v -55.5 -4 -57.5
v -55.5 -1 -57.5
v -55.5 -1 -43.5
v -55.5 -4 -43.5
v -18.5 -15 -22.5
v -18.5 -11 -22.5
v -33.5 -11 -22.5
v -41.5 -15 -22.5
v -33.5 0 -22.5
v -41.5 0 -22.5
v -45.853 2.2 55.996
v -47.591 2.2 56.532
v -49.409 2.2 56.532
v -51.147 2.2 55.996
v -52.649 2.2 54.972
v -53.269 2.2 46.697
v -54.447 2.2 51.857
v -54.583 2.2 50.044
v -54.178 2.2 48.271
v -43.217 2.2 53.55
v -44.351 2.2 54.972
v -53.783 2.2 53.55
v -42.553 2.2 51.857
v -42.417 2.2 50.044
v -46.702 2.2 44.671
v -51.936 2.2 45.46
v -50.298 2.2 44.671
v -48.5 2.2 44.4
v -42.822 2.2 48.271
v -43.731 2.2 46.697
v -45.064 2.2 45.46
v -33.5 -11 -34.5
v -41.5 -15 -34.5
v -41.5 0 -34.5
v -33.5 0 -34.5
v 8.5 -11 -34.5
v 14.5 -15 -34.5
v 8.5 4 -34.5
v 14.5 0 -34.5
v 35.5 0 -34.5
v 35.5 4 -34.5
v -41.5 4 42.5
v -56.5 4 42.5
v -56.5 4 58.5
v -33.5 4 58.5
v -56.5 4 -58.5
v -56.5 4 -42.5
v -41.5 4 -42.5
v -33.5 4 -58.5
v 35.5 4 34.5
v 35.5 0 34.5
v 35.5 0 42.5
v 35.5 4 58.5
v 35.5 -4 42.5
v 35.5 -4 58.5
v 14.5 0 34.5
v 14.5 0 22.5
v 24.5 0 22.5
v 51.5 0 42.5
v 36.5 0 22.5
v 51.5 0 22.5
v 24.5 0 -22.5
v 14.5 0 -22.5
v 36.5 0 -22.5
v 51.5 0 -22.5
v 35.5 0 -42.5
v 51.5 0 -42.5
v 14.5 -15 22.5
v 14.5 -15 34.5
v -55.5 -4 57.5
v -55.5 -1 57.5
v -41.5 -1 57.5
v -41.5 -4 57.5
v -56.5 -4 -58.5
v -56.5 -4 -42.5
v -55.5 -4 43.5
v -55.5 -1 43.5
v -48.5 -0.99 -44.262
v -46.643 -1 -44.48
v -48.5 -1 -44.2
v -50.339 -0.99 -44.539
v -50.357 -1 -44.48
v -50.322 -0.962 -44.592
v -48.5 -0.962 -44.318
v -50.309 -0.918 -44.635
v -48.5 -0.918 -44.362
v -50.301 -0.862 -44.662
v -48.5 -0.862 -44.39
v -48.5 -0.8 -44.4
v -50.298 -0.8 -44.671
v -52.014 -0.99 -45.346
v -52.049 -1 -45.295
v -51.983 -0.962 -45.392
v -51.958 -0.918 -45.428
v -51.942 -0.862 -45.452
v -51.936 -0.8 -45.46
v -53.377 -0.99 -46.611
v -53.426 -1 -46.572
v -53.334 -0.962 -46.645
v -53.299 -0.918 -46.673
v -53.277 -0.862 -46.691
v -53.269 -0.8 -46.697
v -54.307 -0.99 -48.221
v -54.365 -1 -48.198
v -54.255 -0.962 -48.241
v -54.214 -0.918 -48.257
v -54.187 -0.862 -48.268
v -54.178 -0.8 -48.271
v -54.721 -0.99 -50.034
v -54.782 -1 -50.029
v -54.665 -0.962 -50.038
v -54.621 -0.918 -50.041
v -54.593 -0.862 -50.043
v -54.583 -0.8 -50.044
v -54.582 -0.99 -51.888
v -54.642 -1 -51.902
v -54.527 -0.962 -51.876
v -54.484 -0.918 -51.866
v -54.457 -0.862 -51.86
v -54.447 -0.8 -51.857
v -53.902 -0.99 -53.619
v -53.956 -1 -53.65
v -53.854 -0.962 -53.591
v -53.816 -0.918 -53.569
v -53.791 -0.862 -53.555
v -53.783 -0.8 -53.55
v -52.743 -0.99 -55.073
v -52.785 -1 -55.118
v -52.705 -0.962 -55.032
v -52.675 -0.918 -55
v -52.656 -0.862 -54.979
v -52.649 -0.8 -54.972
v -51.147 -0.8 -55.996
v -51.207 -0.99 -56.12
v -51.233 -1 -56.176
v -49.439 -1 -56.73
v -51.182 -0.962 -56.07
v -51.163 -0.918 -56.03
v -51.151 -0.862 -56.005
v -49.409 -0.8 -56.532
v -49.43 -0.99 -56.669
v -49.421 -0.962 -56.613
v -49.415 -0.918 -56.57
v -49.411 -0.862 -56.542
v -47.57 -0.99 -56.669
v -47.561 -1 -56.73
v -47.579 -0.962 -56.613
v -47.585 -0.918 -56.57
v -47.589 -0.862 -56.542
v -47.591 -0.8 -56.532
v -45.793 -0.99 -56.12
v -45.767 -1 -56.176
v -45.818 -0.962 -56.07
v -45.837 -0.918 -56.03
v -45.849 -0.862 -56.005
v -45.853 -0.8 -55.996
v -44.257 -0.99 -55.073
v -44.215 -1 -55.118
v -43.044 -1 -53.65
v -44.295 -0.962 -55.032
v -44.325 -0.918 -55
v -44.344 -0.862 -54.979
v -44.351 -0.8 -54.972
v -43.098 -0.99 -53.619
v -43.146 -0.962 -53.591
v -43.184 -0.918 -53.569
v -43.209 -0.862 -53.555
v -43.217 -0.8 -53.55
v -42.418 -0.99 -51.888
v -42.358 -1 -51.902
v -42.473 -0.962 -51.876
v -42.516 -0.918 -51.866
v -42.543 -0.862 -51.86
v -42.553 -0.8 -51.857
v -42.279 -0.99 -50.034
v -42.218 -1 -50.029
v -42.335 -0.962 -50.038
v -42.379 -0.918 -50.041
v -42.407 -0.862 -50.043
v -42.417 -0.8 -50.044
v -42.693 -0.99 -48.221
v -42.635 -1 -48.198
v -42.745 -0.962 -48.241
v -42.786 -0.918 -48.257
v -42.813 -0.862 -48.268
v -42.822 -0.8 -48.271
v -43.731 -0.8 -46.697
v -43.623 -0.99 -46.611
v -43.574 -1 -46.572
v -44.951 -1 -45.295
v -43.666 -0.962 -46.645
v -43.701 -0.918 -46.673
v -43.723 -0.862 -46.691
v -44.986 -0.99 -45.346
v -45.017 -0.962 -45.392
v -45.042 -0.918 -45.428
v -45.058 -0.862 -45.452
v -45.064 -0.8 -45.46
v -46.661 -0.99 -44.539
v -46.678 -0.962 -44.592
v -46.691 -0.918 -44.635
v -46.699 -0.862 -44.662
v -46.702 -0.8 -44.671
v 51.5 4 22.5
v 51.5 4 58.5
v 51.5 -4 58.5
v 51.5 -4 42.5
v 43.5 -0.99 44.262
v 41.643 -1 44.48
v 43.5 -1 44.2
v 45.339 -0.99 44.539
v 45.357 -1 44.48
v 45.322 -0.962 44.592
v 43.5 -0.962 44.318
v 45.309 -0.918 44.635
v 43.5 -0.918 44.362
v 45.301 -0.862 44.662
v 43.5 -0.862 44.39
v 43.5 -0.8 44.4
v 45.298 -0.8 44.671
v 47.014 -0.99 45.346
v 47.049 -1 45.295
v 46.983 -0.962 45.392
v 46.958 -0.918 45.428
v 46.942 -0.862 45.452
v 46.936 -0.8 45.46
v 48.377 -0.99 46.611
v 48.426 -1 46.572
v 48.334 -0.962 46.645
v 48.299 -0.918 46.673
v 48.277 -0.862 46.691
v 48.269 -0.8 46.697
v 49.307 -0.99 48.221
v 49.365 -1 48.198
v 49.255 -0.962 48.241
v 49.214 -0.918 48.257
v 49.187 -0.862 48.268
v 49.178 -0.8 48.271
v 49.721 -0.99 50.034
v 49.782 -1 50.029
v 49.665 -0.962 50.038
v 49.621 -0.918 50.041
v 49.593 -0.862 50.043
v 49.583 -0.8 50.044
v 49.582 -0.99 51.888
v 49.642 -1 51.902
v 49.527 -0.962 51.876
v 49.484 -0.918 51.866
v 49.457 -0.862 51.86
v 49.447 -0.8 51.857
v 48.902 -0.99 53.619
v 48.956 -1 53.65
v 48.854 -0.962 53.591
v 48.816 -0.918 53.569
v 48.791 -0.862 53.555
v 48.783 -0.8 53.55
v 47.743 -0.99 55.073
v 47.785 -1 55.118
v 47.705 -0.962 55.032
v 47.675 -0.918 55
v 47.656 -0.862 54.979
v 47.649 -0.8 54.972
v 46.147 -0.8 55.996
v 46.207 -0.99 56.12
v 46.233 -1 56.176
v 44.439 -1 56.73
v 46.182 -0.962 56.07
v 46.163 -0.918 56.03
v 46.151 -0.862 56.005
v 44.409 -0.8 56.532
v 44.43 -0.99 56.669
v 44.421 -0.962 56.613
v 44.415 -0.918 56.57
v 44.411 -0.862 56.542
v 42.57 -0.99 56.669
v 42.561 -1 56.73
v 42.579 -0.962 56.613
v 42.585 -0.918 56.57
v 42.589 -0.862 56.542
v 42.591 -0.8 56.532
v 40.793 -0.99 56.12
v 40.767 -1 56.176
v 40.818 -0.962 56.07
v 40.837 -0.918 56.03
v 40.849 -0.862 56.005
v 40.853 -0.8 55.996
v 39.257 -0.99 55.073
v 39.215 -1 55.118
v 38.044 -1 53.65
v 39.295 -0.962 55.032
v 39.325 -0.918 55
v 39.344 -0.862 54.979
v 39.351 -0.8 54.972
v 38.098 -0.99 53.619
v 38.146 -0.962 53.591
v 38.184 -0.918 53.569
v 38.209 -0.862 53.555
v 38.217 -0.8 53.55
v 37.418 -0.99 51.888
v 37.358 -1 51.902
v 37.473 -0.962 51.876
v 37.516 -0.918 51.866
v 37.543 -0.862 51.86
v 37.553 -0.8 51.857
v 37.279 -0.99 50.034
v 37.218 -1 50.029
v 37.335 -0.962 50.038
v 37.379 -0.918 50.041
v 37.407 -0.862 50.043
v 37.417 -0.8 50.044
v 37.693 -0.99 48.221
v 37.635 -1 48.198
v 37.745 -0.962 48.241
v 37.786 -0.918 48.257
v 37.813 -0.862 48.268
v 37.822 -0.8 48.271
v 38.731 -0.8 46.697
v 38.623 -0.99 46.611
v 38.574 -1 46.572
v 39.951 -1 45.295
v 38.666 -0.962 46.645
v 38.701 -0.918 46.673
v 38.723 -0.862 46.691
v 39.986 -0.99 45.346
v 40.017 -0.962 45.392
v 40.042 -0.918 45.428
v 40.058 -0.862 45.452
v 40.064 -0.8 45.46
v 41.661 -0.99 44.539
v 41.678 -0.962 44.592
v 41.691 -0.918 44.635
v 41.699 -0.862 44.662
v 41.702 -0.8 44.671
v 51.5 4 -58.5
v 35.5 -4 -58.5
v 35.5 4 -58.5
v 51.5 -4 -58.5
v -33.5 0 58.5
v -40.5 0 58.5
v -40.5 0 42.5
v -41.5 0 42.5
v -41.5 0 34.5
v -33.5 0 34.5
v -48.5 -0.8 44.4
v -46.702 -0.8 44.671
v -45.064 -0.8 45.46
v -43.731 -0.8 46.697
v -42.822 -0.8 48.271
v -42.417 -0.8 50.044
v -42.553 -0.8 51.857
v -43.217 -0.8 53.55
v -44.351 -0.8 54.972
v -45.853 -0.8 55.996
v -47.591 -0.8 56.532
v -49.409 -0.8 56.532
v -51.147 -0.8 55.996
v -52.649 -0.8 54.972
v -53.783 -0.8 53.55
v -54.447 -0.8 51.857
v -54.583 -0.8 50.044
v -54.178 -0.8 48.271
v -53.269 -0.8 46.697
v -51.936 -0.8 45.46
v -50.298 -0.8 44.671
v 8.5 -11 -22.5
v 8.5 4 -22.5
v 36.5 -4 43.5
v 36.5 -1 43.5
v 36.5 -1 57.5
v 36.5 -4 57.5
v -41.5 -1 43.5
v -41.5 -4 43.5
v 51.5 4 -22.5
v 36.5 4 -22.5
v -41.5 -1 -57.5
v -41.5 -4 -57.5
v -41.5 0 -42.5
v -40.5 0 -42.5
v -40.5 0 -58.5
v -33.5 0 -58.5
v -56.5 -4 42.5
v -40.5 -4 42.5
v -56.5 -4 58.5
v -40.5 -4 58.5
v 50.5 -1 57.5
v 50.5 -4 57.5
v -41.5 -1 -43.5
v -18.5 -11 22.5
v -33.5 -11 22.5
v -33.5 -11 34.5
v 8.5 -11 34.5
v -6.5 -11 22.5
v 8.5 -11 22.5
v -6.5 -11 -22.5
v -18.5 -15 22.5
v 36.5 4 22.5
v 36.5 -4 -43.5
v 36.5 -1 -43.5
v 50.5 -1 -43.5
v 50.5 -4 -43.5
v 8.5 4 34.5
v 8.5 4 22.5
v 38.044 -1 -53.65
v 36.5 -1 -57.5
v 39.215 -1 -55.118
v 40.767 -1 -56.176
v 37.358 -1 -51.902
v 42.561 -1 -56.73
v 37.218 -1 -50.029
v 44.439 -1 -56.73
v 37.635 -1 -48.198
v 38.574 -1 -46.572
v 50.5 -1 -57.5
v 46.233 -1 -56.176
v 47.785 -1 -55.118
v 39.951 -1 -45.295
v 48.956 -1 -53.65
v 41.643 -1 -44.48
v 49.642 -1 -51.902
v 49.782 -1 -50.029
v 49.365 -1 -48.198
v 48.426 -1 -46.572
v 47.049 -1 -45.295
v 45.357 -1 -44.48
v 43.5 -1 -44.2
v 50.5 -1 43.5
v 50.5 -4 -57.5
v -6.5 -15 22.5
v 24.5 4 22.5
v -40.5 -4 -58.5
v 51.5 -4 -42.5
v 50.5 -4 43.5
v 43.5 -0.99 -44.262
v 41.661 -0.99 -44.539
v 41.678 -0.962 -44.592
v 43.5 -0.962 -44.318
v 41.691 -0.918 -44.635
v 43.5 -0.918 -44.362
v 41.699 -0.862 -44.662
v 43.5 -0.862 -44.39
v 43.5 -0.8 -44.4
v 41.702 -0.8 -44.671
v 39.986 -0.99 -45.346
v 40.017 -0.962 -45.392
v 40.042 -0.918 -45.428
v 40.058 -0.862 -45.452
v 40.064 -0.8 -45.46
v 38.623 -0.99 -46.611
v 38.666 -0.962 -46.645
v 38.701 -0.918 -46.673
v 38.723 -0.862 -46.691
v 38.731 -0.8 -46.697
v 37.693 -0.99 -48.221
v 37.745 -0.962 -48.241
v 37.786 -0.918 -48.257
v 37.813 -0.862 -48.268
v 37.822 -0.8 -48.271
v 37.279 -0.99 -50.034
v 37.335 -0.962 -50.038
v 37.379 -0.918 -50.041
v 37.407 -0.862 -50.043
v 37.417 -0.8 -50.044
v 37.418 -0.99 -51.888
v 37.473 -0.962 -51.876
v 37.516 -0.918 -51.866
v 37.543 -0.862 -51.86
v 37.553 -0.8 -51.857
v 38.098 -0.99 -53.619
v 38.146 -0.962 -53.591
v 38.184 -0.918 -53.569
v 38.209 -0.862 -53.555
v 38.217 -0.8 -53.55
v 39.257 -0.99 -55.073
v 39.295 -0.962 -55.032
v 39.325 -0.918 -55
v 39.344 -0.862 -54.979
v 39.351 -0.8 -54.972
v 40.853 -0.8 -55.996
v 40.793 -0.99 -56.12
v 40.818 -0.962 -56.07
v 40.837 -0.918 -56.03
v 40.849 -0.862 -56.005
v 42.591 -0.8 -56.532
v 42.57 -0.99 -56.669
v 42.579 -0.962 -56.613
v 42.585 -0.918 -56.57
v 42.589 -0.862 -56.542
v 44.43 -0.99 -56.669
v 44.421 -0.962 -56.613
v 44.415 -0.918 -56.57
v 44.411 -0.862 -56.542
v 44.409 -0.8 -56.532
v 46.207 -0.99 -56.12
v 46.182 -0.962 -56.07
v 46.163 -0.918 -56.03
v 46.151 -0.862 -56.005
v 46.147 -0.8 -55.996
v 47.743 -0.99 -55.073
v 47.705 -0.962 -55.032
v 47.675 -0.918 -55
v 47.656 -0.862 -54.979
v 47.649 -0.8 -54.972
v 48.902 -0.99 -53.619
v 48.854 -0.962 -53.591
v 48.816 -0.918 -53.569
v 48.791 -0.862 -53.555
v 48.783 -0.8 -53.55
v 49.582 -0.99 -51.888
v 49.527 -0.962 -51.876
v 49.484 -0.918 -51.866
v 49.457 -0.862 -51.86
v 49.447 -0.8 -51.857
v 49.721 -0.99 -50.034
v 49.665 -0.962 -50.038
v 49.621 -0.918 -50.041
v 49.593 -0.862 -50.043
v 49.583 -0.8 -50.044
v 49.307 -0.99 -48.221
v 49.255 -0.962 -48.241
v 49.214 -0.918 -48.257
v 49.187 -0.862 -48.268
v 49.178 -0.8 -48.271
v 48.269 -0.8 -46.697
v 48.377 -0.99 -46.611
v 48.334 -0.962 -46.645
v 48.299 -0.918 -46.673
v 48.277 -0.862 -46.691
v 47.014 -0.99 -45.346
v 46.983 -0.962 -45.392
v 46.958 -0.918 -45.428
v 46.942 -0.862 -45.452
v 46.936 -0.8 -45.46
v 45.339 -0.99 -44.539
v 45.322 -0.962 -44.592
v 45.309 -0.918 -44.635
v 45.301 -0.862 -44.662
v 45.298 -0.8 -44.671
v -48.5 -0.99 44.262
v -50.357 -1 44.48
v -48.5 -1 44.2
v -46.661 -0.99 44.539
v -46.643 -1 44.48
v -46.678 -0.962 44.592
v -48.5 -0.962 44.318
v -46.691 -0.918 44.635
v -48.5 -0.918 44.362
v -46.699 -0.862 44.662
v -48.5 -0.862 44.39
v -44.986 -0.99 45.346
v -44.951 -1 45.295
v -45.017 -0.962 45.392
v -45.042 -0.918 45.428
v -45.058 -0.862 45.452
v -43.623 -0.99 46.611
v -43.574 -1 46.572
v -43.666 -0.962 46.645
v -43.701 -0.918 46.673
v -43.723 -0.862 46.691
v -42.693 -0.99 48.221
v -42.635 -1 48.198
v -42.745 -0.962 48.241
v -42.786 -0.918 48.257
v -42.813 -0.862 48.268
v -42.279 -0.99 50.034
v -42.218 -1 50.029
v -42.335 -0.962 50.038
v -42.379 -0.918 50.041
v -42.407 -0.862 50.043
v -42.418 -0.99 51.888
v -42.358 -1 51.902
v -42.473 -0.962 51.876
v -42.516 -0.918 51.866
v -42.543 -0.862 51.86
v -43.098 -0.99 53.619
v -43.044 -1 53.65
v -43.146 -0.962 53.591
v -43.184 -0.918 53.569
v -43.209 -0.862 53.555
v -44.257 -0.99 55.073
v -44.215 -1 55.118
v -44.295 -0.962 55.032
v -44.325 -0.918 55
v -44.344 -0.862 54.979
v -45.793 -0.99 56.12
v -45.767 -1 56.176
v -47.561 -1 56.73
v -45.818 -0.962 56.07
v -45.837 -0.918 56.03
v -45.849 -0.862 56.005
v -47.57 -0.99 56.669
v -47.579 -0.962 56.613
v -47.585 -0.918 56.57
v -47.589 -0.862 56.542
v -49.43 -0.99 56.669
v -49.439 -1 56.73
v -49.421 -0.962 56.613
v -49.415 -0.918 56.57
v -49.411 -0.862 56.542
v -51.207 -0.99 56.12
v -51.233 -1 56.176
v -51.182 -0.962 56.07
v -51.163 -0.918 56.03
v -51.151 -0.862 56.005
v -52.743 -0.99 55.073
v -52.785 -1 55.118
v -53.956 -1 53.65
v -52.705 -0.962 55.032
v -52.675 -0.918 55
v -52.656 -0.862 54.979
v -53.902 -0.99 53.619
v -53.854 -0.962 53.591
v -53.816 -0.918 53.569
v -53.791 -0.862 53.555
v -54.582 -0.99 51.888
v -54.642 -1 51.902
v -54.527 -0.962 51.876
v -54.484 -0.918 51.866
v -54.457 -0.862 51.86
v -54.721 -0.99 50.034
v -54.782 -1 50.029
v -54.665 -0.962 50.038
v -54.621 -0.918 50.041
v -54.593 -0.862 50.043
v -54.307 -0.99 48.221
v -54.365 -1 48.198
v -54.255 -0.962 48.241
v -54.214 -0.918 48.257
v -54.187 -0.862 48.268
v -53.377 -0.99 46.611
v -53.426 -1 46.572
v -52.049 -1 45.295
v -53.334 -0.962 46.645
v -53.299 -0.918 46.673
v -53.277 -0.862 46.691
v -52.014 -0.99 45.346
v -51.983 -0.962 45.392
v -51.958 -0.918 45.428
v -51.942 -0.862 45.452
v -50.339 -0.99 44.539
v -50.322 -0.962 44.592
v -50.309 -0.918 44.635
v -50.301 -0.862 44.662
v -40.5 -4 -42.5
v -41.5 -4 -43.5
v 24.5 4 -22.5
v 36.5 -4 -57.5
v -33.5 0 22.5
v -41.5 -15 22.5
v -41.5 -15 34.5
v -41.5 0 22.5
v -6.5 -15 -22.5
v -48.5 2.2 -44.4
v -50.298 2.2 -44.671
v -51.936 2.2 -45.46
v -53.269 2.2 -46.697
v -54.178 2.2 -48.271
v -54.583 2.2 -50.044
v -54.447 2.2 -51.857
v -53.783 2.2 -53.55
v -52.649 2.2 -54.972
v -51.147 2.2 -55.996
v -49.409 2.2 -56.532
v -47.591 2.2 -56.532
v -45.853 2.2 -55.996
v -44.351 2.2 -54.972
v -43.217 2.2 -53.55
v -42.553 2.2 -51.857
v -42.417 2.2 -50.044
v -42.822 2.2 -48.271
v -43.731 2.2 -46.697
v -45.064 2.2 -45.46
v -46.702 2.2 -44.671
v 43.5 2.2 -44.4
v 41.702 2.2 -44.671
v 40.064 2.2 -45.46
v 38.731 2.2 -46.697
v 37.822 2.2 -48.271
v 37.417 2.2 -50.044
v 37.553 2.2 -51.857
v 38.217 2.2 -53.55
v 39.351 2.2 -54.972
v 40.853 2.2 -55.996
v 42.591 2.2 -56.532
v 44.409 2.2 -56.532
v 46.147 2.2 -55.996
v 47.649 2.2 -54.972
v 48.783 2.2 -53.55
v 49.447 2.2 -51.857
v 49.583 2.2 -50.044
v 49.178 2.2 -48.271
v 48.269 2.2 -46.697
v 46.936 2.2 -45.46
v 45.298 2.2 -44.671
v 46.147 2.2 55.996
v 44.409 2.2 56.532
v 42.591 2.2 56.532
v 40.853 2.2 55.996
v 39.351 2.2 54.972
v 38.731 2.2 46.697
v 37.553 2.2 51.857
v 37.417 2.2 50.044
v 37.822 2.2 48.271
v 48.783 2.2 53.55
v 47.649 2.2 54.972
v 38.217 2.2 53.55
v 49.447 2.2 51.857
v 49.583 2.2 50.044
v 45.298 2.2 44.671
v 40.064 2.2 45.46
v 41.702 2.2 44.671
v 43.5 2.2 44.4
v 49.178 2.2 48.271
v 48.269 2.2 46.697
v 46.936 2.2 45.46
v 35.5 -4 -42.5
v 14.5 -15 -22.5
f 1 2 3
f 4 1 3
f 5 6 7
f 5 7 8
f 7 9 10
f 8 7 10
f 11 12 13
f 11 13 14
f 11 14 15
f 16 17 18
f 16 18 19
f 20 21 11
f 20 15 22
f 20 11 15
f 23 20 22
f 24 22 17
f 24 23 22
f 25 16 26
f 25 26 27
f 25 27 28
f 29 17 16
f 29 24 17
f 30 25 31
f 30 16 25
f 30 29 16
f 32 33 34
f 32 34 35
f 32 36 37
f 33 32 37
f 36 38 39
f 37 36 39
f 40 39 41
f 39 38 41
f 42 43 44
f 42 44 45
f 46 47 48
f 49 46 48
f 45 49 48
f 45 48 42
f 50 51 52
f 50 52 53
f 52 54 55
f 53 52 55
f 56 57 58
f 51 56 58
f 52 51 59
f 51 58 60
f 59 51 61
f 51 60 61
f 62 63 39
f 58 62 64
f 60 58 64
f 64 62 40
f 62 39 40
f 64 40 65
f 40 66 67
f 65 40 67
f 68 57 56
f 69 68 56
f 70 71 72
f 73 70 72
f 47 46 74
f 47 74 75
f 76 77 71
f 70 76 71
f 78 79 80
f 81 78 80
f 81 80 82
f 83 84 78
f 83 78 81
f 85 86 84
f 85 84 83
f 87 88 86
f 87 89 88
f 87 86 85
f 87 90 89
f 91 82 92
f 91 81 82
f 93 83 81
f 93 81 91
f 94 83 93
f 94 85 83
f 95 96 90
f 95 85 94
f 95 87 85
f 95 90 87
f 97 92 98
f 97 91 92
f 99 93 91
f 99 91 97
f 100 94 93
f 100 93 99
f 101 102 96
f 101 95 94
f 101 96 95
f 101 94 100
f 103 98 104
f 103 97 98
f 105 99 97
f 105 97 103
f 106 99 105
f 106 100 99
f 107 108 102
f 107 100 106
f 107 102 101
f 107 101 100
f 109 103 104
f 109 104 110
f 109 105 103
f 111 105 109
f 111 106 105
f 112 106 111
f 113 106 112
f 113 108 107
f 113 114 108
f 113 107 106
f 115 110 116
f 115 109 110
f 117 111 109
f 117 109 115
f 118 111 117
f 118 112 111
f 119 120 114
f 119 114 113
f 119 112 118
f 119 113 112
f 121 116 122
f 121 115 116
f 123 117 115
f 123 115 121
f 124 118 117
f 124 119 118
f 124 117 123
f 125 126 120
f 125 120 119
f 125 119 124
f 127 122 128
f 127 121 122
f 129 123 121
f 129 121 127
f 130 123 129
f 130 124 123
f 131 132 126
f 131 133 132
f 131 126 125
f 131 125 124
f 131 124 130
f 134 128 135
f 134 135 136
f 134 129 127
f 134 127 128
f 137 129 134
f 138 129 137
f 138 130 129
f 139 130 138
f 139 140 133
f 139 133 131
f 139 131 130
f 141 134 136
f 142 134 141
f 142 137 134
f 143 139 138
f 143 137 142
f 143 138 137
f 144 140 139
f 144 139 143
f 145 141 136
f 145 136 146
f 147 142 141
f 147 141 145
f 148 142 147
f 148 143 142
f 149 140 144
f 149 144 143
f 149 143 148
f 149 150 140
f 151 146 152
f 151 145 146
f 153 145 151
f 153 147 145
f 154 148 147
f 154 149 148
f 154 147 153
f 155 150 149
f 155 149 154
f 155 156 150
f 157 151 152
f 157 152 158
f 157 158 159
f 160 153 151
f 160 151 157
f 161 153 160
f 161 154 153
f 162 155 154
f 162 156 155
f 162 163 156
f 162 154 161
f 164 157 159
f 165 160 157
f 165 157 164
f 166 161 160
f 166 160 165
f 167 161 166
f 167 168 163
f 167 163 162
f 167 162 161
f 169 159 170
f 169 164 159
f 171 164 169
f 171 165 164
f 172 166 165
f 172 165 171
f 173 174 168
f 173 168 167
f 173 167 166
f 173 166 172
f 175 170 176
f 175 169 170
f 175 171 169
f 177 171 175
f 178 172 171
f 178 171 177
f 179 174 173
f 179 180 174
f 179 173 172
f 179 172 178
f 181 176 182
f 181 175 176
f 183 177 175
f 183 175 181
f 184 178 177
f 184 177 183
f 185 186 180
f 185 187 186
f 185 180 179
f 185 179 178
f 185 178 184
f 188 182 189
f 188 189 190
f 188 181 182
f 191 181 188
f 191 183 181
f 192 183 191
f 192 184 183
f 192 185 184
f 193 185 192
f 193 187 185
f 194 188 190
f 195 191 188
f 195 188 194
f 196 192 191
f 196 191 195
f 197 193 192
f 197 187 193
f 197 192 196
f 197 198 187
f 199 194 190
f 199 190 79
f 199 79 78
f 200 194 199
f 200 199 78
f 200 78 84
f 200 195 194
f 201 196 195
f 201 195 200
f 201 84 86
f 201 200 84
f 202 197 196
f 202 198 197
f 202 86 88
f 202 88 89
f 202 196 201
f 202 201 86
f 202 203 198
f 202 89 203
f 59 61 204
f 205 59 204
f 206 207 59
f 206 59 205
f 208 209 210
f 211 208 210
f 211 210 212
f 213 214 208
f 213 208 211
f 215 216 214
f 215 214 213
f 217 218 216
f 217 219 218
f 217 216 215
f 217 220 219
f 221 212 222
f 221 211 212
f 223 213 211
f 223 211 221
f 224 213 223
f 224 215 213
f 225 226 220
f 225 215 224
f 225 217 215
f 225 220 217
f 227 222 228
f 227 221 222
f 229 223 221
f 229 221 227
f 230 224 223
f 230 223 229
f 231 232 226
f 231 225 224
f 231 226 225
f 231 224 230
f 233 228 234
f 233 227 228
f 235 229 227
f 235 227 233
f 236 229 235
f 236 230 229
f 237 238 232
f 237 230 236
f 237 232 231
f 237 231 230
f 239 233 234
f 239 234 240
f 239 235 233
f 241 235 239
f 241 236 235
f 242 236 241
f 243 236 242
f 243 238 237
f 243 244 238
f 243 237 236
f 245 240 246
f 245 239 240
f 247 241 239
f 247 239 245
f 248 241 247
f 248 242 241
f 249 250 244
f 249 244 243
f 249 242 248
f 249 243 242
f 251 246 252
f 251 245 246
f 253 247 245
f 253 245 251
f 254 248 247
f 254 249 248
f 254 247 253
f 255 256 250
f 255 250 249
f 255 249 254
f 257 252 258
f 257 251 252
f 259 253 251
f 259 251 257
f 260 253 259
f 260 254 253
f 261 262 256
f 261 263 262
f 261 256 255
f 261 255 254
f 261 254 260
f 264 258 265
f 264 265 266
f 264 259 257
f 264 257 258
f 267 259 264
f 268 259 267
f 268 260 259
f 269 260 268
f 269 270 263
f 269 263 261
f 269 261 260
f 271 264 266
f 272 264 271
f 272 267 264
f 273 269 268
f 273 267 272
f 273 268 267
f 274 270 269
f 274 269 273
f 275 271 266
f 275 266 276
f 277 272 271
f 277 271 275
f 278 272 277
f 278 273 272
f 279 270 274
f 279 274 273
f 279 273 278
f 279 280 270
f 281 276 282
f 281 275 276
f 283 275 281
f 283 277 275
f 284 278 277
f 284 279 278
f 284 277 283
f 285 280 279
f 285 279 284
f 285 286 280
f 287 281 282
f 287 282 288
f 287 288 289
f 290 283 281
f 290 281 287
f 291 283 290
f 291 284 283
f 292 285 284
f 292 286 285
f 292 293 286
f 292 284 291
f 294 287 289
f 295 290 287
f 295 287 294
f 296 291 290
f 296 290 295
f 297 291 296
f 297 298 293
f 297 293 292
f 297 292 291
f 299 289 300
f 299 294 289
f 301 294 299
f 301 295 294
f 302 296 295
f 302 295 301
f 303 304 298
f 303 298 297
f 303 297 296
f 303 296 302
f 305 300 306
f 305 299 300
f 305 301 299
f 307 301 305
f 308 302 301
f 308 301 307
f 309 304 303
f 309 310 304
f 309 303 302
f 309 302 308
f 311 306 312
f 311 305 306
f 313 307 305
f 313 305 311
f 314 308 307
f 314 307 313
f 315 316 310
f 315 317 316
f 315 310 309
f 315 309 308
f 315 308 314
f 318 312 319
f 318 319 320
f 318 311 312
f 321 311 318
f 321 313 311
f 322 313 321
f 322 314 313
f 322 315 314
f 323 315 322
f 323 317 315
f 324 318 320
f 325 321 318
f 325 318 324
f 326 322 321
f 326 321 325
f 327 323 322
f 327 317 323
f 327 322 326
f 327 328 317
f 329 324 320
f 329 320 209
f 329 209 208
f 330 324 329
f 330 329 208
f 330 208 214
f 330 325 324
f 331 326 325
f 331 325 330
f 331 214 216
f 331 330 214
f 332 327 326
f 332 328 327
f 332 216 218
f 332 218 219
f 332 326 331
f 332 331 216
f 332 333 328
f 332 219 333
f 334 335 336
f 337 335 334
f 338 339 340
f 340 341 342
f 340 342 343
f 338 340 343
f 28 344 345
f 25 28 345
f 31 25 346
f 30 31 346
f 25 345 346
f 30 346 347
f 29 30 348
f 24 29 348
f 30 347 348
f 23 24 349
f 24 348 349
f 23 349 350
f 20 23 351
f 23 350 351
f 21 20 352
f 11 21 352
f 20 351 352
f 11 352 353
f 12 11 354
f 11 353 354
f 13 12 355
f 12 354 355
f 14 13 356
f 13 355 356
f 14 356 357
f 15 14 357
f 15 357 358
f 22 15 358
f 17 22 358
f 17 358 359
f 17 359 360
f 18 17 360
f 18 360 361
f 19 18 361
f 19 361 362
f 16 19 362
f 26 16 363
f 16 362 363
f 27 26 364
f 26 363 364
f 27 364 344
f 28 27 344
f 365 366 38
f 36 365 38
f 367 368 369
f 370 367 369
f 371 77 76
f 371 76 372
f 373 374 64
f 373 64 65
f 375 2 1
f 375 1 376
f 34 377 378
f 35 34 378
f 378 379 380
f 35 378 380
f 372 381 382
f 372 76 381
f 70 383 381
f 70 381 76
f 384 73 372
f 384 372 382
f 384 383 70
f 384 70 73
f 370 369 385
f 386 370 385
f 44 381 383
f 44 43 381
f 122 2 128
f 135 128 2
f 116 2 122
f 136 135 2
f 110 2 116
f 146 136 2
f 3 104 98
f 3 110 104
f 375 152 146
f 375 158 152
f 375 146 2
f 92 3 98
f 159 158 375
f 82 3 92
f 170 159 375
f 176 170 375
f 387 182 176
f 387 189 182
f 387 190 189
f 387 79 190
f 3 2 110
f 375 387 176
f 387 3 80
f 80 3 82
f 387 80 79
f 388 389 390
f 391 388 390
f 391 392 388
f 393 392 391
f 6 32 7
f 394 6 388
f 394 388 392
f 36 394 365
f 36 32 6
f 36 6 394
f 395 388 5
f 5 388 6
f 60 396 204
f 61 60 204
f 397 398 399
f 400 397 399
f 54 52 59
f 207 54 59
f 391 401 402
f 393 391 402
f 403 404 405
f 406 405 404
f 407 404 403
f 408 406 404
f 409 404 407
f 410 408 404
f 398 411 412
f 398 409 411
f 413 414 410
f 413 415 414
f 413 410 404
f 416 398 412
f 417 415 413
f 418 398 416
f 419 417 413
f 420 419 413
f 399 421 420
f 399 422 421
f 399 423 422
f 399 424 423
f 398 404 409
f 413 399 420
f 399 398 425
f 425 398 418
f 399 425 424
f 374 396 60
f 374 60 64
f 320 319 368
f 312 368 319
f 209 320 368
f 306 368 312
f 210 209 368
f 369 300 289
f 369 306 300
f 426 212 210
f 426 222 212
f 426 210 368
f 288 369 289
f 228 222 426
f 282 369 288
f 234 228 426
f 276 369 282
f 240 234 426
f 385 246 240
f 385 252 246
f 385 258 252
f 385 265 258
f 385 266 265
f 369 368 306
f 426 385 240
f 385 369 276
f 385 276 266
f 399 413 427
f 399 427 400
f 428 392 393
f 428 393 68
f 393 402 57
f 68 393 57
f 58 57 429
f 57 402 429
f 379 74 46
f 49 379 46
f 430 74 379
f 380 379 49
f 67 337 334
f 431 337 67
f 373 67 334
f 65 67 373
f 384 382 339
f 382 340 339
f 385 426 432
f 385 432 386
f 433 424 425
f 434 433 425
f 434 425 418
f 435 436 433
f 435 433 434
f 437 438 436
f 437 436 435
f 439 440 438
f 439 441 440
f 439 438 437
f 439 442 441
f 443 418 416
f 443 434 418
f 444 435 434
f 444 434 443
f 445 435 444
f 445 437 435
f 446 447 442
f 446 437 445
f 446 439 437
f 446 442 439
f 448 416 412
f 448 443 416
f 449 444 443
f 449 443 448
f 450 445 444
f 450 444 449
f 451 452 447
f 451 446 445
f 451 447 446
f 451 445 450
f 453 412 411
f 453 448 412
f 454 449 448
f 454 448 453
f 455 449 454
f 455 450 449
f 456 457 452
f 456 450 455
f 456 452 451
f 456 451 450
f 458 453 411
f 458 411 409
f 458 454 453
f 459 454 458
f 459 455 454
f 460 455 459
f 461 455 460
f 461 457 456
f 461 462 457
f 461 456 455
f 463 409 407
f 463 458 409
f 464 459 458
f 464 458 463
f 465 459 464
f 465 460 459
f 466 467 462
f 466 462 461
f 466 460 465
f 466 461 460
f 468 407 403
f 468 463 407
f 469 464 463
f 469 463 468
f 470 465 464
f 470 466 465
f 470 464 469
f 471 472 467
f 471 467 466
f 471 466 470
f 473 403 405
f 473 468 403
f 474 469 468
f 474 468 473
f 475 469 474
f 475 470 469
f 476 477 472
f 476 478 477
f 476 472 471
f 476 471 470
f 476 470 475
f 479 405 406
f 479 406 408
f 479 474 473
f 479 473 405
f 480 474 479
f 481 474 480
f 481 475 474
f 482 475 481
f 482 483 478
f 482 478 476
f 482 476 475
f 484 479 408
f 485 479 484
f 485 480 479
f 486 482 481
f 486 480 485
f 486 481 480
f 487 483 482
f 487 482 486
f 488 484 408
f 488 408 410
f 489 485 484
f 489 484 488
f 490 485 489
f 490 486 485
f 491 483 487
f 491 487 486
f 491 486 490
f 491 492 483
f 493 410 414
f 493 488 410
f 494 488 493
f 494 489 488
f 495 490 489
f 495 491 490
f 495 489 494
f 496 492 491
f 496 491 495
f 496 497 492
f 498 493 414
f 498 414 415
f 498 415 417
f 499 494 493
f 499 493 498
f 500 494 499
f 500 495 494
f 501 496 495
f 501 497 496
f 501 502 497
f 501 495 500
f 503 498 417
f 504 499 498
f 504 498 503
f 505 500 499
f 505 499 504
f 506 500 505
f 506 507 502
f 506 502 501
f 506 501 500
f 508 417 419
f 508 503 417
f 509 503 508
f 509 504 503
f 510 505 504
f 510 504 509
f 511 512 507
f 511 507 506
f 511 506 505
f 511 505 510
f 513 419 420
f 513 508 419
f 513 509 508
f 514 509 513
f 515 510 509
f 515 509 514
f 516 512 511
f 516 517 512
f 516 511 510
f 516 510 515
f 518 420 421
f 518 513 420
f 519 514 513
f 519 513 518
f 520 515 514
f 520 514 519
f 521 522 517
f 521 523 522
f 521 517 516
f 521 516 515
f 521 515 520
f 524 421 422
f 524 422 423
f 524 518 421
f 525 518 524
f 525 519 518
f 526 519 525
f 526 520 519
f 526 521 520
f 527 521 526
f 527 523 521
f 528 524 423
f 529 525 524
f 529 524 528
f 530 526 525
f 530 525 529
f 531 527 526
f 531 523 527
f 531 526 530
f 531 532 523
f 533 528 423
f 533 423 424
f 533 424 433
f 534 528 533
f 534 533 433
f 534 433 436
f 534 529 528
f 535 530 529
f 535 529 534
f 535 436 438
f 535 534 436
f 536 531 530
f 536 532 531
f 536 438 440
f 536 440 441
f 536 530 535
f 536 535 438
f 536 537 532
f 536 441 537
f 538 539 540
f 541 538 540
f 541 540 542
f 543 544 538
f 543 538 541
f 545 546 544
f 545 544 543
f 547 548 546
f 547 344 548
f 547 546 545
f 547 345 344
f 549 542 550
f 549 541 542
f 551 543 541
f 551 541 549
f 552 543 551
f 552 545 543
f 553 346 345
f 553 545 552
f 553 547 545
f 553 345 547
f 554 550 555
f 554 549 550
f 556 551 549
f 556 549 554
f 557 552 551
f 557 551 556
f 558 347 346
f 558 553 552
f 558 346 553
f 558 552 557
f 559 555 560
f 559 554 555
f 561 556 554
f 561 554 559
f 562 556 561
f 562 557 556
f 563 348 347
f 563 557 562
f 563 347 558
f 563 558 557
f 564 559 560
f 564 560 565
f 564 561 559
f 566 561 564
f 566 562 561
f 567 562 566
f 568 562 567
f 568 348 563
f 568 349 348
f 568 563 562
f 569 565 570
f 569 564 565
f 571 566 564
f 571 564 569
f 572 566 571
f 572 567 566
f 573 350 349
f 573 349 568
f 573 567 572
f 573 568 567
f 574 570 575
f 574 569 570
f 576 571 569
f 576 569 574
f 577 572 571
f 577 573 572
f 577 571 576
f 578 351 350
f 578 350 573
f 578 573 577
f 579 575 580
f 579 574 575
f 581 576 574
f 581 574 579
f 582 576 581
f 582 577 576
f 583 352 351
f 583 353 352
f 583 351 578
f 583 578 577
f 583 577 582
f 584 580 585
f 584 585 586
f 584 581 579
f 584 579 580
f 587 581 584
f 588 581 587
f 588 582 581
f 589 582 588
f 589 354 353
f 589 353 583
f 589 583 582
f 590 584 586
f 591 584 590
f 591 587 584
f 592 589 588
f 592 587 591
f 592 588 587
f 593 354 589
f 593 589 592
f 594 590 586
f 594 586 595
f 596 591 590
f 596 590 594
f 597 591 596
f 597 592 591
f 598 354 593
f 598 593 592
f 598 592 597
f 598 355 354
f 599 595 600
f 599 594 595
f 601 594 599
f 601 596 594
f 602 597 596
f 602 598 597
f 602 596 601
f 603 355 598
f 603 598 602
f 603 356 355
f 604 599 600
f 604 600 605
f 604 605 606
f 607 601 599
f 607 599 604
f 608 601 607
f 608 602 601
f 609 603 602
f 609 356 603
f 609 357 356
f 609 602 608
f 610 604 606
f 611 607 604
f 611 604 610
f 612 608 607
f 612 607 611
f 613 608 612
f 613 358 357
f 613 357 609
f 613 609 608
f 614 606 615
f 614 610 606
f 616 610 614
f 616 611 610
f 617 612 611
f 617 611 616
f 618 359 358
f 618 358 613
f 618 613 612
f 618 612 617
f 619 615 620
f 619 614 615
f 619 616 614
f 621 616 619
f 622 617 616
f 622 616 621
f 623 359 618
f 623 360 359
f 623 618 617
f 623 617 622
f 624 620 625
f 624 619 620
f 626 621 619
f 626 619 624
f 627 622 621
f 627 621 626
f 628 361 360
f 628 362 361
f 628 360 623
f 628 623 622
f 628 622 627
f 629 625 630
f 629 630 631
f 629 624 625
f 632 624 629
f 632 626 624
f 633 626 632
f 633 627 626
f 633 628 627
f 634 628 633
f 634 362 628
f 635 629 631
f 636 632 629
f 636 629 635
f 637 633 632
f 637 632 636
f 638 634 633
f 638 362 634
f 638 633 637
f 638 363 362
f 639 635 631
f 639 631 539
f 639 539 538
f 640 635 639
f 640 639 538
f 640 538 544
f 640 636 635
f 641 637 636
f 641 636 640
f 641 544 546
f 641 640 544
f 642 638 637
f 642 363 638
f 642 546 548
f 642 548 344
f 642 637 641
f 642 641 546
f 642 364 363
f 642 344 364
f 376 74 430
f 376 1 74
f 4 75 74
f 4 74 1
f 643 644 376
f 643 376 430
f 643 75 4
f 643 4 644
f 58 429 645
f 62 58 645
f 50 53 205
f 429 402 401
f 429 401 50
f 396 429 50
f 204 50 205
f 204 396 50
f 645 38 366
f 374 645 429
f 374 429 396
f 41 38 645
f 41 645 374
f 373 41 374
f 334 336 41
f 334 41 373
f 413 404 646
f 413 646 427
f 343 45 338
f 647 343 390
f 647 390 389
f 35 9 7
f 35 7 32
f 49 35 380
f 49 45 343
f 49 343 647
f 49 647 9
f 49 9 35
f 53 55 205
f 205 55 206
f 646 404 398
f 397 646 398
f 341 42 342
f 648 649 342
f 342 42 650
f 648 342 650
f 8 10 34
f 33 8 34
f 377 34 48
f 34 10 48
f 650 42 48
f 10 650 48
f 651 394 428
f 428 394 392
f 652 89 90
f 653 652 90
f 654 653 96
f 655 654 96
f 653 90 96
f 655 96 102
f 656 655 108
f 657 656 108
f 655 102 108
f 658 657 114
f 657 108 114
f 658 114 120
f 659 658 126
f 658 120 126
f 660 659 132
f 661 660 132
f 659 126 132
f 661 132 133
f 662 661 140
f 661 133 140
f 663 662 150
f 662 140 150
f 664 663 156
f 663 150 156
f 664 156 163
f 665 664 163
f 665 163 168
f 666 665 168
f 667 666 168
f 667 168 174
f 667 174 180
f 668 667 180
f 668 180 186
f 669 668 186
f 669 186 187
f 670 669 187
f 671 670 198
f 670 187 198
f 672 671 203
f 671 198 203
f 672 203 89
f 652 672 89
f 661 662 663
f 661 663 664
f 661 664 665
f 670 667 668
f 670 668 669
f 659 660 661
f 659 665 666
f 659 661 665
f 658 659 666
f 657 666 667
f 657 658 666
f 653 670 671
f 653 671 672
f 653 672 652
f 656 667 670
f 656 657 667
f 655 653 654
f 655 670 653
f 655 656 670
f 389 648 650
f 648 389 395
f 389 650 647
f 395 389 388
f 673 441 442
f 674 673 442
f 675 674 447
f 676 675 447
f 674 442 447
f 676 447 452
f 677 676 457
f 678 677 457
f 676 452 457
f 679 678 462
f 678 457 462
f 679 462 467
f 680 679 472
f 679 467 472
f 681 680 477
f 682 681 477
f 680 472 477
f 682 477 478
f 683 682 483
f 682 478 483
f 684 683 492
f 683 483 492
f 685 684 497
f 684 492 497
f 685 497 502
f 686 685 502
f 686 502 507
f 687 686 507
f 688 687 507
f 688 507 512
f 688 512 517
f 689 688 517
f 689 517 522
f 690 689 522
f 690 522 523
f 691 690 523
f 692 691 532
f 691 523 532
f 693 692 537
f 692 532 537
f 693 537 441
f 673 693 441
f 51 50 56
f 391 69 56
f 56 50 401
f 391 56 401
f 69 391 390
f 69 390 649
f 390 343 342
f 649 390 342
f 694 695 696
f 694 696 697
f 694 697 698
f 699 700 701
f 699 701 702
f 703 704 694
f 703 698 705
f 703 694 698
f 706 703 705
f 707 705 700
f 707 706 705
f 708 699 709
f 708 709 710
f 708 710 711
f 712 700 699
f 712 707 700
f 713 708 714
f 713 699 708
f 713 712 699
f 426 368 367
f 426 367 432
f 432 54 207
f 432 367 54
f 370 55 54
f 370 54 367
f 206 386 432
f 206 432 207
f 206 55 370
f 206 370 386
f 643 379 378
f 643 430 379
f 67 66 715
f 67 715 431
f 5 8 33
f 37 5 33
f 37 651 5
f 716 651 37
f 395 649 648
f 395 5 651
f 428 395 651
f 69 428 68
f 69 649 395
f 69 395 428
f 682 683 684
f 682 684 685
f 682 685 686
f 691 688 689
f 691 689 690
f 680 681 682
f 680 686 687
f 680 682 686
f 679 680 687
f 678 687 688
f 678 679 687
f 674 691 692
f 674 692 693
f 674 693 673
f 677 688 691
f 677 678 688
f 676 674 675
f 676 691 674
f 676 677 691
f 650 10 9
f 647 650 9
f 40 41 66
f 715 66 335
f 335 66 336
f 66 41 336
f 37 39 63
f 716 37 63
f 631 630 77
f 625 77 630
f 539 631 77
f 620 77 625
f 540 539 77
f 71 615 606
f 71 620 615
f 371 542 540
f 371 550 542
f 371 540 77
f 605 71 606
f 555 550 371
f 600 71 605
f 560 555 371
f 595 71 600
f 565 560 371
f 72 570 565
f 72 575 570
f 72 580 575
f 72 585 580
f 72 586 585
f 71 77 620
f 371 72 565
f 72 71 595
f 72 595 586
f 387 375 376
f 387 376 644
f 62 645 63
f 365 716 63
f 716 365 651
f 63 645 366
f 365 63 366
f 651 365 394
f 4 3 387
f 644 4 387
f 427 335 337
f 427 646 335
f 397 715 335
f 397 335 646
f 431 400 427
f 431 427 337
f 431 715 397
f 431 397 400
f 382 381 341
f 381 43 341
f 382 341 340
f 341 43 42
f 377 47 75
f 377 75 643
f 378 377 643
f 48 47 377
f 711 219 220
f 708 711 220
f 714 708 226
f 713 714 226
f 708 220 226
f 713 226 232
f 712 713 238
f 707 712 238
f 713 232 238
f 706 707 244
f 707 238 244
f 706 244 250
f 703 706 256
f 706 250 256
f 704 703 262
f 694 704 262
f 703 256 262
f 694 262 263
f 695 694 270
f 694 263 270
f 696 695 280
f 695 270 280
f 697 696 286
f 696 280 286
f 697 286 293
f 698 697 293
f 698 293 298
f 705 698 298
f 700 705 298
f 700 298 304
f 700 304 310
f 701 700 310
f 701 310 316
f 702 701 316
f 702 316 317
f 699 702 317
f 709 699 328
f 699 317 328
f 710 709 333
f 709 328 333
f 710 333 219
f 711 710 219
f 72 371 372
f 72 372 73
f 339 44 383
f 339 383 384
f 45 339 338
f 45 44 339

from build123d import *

# Parameters (mm, degrees)
SKETCH1_W                       = 113
SKETCH1_H                       = 85
BOSS_EXTRUDE1_DEPTH             = 4
BOSS_EXTRUDE3_REACH             = 72.813
SKETCH4_W                       = 16
SKETCH4_H                       = 16
BOSS_EXTRUDE3_DIRECTION_2_DEPTH = 1
SKETCH10_W                      = 10
SKETCH10_H                      = 16
BOSS_EXTRUDE6_DEPTH             = 4
SKETCH6_W                       = 73
SKETCH6_H                       = 45
SKETCH6_W_2                     = 15
SKETCH6_H_2                     = 85
SKETCH6_W_3                     = 66
SKETCH6_H_3                     = 8
CUT_EXTRUDE2_DEPTH              = 82.483127088
SKETCH8_R                       = 6.1
CUT_EXTRUDE3_DEPTH              = 3.2
SKETCH9_W                       = 16
SKETCH9_H                       = 16
SKETCH9_W_2                     = 14
SKETCH9_H_2                     = 14
BOSS_EXTRUDE5_DEPTH             = 3
FILLET1_R                       = 0.2
SKETCH13_W                      = 85
SKETCH13_H                      = 4
CUT_EXTRUDE4_DEPTH              = 5
SKETCH14_W                      = 93
SKETCH14_H                      = 45
CUT_EXTRUDE5_DEPTH              = 82.722090037
SKETCH15_W                      = 12
SKETCH15_H                      = 45
BOSS_EXTRUDE7_DEPTH             = 4
BOSS_EXTRUDE8_DEPTH             = 15
SKETCH17_W                      = 42
SKETCH17_H                      = 117
CUT_EXTRUDE6_DEPTH              = 15
SKETCH18_W                      = 8
SKETCH18_H                      = 45
BOSS_EXTRUDE9_DEPTH             = 4


with BuildPart() as part:
    # Sketch1 → Boss-Extrude1 (new body)
    with BuildSketch(Plane(origin=(0, 0, 0), x_dir=(1, 0, 0), z_dir=(0, 1, 0))):
        Rectangle(SKETCH1_W, SKETCH1_H)
    extrude(amount=BOSS_EXTRUDE1_DEPTH)

    # Boss-Extrude3: up to this face of the body (flat: up to its plane)
    boss_extrude3_end = Plane(part.part.faces().sort_by_distance((0, 4, 0))[0])
    # Sketch4 → Boss-Extrude3 (add, up to the picked face)
    with BuildSketch(Plane.XZ, mode=Mode.PRIVATE) as boss_extrude3_sk1:
        with Locations((-48.5, 50.5)):
            Rectangle(SKETCH4_W, SKETCH4_H)
    boss_extrude3_tool1 = split(extrude(boss_extrude3_sk1.sketch, amount=-BOSS_EXTRUDE3_REACH, mode=Mode.PRIVATE), bisect_by=boss_extrude3_end, keep=Keep.BOTH, mode=Mode.PRIVATE)
    # Sketch4 → Boss-Extrude3 (add, up to the picked face)
    with BuildSketch(Plane.XZ, mode=Mode.PRIVATE) as boss_extrude3_sk2:
        with Locations((43.5, 50.5)):
            Rectangle(SKETCH4_W, SKETCH4_H)
    boss_extrude3_tool2 = split(extrude(boss_extrude3_sk2.sketch, amount=-BOSS_EXTRUDE3_REACH, mode=Mode.PRIVATE), bisect_by=boss_extrude3_end, keep=Keep.BOTH, mode=Mode.PRIVATE)
    # Sketch4 → Boss-Extrude3 (add, up to the picked face)
    with BuildSketch(Plane.XZ, mode=Mode.PRIVATE) as boss_extrude3_sk3:
        with Locations((43.5, -50.5)):
            Rectangle(SKETCH4_W, SKETCH4_H)
    boss_extrude3_tool3 = split(extrude(boss_extrude3_sk3.sketch, amount=-BOSS_EXTRUDE3_REACH, mode=Mode.PRIVATE), bisect_by=boss_extrude3_end, keep=Keep.BOTH, mode=Mode.PRIVATE)
    # Sketch4 → Boss-Extrude3 (add, up to the picked face)
    with BuildSketch(Plane.XZ, mode=Mode.PRIVATE) as boss_extrude3_sk4:
        with Locations((-48.5, -50.5)):
            Rectangle(SKETCH4_W, SKETCH4_H)
    boss_extrude3_tool4 = split(extrude(boss_extrude3_sk4.sketch, amount=-BOSS_EXTRUDE3_REACH, mode=Mode.PRIVATE), bisect_by=boss_extrude3_end, keep=Keep.BOTH, mode=Mode.PRIVATE)
    add(boss_extrude3_tool1.solids().sort_by(Axis((-48.5, 0, 50.5), (0, 1, 0)))[0])
    add(boss_extrude3_tool2.solids().sort_by(Axis((43.5, 0, 50.5), (0, 1, 0)))[0])
    add(boss_extrude3_tool3.solids().sort_by(Axis((43.5, 0, -50.5), (0, 1, 0)))[0])
    add(boss_extrude3_tool4.solids().sort_by(Axis((-48.5, 0, -50.5), (0, 1, 0)))[0])

    # Sketch4 → Boss-Extrude3 direction 2 (add)
    with BuildSketch(Plane.XZ):
        with Locations((-48.5, 50.5)):
            Rectangle(SKETCH4_W, SKETCH4_H)
        with Locations((43.5, 50.5)):
            Rectangle(SKETCH4_W, SKETCH4_H)
        with Locations((43.5, -50.5)):
            Rectangle(SKETCH4_W, SKETCH4_H)
        with Locations((-48.5, -50.5)):
            Rectangle(SKETCH4_W, SKETCH4_H)
    extrude(amount=BOSS_EXTRUDE3_DIRECTION_2_DEPTH)

    # Sketch10 → Boss-Extrude6 (add)
    with BuildSketch(Plane(origin=(0, 4, 0), x_dir=(1, 0, 0), z_dir=(0, 1, 0))):
        with Locations((-35.5, -50.5)):
            Rectangle(SKETCH10_W, SKETCH10_H)
        with Locations((-35.5, 50.5)):
            Rectangle(SKETCH10_W, SKETCH10_H)
    extrude(amount=-BOSS_EXTRUDE6_DEPTH)

    # Sketch6 → Cut-Extrude2 (cut, through all)
    with BuildSketch(Plane(origin=(0, 4, 0), x_dir=(1, 0, 0), z_dir=(0, 1, 0))):
        with Locations((5, 0)):
            Rectangle(SKETCH6_W, SKETCH6_H)
        with Locations((-49, 0)):
            Rectangle(SKETCH6_W_2, SKETCH6_H_2)
        with Locations((2.5, 38.5)):
            Rectangle(SKETCH6_W_3, SKETCH6_H_3)
        with Locations((2.5, -38.5)):
            Rectangle(SKETCH6_W_3, SKETCH6_H_3)
    extrude(amount=-CUT_EXTRUDE2_DEPTH, mode=Mode.SUBTRACT)

    # Sketch8 → Cut-Extrude3 (cut)
    with BuildSketch(Plane.XZ.offset(1)):
        with Locations(Location((-48.5, 50.5, 0), (0, 0, 270))):
            Circle(SKETCH8_R)
        with Locations(Location((43.5, 50.5, 0), (0, 0, 270))):
            Circle(SKETCH8_R)
        with Locations(Location((43.5, -50.5, 0), (0, 0, 90))):
            Circle(SKETCH8_R)
        with Locations(Location((-48.5, -50.5, 0), (0, 0, 90))):
            Circle(SKETCH8_R)
    extrude(amount=-CUT_EXTRUDE3_DEPTH, mode=Mode.SUBTRACT)

    # Sketch9 → Boss-Extrude5 (add)
    # profile 1 of 4: a face of its own
    with BuildSketch(Plane.XZ.offset(1)):
        with Locations((-48.5, 50.5)):
            Rectangle(SKETCH9_W, SKETCH9_H)
        with Locations((-48.5, 50.5)):
            Rectangle(SKETCH9_W_2, SKETCH9_H_2, mode=Mode.SUBTRACT)
    # profile 2 of 4: a face of its own
    with BuildSketch(Plane.XZ.offset(1)):
        with Locations((43.5, 50.5)):
            Rectangle(SKETCH9_W, SKETCH9_H)
        with Locations((43.5, 50.5)):
            Rectangle(SKETCH9_W_2, SKETCH9_H_2, mode=Mode.SUBTRACT)
    # profile 3 of 4: a face of its own
    with BuildSketch(Plane.XZ.offset(1)):
        with Locations((43.5, -50.5)):
            Rectangle(SKETCH9_W, SKETCH9_H)
        with Locations((43.5, -50.5)):
            Rectangle(SKETCH9_W_2, SKETCH9_H_2, mode=Mode.SUBTRACT)
    # profile 4 of 4: a face of its own
    with BuildSketch(Plane.XZ.offset(1)):
        with Locations((-48.5, -50.5)):
            Rectangle(SKETCH9_W, SKETCH9_H)
        with Locations((-48.5, -50.5)):
            Rectangle(SKETCH9_W_2, SKETCH9_H_2, mode=Mode.SUBTRACT)
    extrude(amount=BOSS_EXTRUDE5_DEPTH)

    # Fillet1
    fillet1_edges = [part.edges().sort_by_distance(p)[0] for p in [
        (-48.5, -1, -56.6),
        (43.5, -1, -56.6),
        (43.5, -1, 56.6),
        (-48.5, -1, 56.6),
    ]]
    fillet(fillet1_edges, radius=FILLET1_R)

    # Sketch13 → Cut-Extrude4 (cut)
    with BuildSketch(Plane(origin=(56.5, 0, 0), x_dir=(0, 0, -1), z_dir=(1, 0, 0))):
        with Locations((0, 2)):
            Rectangle(SKETCH13_W, SKETCH13_H)
    extrude(amount=-CUT_EXTRUDE4_DEPTH, mode=Mode.SUBTRACT)

    # Sketch14 → Cut-Extrude5 (cut, through all)
    with BuildSketch(Plane(origin=(0, 4, 0), x_dir=(1, 0, 0), z_dir=(0, 1, 0))):
        with Locations((5, 0)):
            Rectangle(SKETCH14_W, SKETCH14_H)
    extrude(amount=-CUT_EXTRUDE5_DEPTH, mode=Mode.SUBTRACT)


with BuildPart() as cut_extrude5_piece_1:
    # of the separate pieces the step leaves, piece 1, a body of its own (cut_extrude5_pieces)
    add(part.part.solids().sort_by_distance((-40.5, 0, -42.5))[0])



with BuildPart() as cut_extrude5_piece_2:
    # of the separate pieces the step leaves, piece 2, a body of its own (cut_extrude5_pieces)
    add(part.part.solids().sort_by_distance((-48.5, -1, 44.2))[0])


with BuildPart() as cut_extrude5_piece_1_1:
    add(cut_extrude5_piece_1.part)

    add(cut_extrude5_piece_2.part)  # Boss-Extrude7 merges Cut-Extrude5 piece 2
    # Sketch15 → Boss-Extrude7 (add)
    with BuildSketch(Plane(origin=(0, 4, 0), x_dir=(1, 0, 0), z_dir=(0, 1, 0))):
        with Locations((-12.5, 0)):
            Rectangle(SKETCH15_W, SKETCH15_H)
        with Locations((30.5, 0)):
            Rectangle(SKETCH15_W, SKETCH15_H)
    extrude(amount=-BOSS_EXTRUDE7_DEPTH)

    # Sketch16 → Boss-Extrude8 (add)
    with BuildSketch(Plane.XZ):
        Polygon((-6.5, -22.5), (-6.5, 22.5), (14.5, 22.5), (14.5, 34.5), (-30.5, 34.5), (-41.5, 34.5), (-41.5, 22.5), (-18.5, 22.5), (-18.5, -22.5), (-41.5, -22.5), (-41.5, -34.5), (-30.5, -34.5), (14.5, -34.5), (14.5, -22.5), align=None)
    extrude(amount=BOSS_EXTRUDE8_DEPTH)

    # Sketch17 → Cut-Extrude6 (cut)
    with BuildSketch(Plane(origin=(0, 4, 0), x_dir=(1, 0, 0), z_dir=(0, 1, 0))):
        with Locations((-12.5, 0)):
            Rectangle(SKETCH17_W, SKETCH17_H)
    extrude(amount=-CUT_EXTRUDE6_DEPTH, mode=Mode.SUBTRACT)

    # Sketch18 → Boss-Extrude9 (add)
    with BuildSketch(Plane(origin=(0, 4, 0), x_dir=(1, 0, 0), z_dir=(0, 1, 0))):
        with Locations((-37.5, 0)):
            Rectangle(SKETCH18_W, SKETCH18_H)
    extrude(amount=-BOSS_EXTRUDE9_DEPTH)


solid = cut_extrude5_piece_1_1.part
